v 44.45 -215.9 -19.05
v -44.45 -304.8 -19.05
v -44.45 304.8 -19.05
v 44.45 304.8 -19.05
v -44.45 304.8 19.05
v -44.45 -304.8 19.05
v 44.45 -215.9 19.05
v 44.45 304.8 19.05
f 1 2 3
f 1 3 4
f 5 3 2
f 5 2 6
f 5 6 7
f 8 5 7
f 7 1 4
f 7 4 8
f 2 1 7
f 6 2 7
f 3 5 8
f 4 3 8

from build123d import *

# Parameters (mm, degrees)
F0_W     = 88.9
F0_H     = 38.1
F1_DEPTH = 304.8
F2_SIZE2 = 88.89999
F2_SIZE  = 88.89999


# Not quite as in the source:
# - a fillet or chamfer is up to 0.001 mm smaller than in the source, because OpenCascade refuses the exact size


with BuildPart() as f1:
    # F0 (on Front) → F1 (new body, symmetric)
    with BuildSketch(Plane.XZ):
        Rectangle(F0_W, F0_H)
    extrude(amount=F1_DEPTH, both=True)

    # F2 (size 88.9 and 88.9 in the source; OpenCascade refuses exactly that, so slightly less here)
    f2_edges = [f1.edges().sort_by_distance(p)[0] for p in [
        (44.45, -304.8, 0),
    ]]
    chamfer(f2_edges, length=F2_SIZE, length2=F2_SIZE2)


solid = f1.part
